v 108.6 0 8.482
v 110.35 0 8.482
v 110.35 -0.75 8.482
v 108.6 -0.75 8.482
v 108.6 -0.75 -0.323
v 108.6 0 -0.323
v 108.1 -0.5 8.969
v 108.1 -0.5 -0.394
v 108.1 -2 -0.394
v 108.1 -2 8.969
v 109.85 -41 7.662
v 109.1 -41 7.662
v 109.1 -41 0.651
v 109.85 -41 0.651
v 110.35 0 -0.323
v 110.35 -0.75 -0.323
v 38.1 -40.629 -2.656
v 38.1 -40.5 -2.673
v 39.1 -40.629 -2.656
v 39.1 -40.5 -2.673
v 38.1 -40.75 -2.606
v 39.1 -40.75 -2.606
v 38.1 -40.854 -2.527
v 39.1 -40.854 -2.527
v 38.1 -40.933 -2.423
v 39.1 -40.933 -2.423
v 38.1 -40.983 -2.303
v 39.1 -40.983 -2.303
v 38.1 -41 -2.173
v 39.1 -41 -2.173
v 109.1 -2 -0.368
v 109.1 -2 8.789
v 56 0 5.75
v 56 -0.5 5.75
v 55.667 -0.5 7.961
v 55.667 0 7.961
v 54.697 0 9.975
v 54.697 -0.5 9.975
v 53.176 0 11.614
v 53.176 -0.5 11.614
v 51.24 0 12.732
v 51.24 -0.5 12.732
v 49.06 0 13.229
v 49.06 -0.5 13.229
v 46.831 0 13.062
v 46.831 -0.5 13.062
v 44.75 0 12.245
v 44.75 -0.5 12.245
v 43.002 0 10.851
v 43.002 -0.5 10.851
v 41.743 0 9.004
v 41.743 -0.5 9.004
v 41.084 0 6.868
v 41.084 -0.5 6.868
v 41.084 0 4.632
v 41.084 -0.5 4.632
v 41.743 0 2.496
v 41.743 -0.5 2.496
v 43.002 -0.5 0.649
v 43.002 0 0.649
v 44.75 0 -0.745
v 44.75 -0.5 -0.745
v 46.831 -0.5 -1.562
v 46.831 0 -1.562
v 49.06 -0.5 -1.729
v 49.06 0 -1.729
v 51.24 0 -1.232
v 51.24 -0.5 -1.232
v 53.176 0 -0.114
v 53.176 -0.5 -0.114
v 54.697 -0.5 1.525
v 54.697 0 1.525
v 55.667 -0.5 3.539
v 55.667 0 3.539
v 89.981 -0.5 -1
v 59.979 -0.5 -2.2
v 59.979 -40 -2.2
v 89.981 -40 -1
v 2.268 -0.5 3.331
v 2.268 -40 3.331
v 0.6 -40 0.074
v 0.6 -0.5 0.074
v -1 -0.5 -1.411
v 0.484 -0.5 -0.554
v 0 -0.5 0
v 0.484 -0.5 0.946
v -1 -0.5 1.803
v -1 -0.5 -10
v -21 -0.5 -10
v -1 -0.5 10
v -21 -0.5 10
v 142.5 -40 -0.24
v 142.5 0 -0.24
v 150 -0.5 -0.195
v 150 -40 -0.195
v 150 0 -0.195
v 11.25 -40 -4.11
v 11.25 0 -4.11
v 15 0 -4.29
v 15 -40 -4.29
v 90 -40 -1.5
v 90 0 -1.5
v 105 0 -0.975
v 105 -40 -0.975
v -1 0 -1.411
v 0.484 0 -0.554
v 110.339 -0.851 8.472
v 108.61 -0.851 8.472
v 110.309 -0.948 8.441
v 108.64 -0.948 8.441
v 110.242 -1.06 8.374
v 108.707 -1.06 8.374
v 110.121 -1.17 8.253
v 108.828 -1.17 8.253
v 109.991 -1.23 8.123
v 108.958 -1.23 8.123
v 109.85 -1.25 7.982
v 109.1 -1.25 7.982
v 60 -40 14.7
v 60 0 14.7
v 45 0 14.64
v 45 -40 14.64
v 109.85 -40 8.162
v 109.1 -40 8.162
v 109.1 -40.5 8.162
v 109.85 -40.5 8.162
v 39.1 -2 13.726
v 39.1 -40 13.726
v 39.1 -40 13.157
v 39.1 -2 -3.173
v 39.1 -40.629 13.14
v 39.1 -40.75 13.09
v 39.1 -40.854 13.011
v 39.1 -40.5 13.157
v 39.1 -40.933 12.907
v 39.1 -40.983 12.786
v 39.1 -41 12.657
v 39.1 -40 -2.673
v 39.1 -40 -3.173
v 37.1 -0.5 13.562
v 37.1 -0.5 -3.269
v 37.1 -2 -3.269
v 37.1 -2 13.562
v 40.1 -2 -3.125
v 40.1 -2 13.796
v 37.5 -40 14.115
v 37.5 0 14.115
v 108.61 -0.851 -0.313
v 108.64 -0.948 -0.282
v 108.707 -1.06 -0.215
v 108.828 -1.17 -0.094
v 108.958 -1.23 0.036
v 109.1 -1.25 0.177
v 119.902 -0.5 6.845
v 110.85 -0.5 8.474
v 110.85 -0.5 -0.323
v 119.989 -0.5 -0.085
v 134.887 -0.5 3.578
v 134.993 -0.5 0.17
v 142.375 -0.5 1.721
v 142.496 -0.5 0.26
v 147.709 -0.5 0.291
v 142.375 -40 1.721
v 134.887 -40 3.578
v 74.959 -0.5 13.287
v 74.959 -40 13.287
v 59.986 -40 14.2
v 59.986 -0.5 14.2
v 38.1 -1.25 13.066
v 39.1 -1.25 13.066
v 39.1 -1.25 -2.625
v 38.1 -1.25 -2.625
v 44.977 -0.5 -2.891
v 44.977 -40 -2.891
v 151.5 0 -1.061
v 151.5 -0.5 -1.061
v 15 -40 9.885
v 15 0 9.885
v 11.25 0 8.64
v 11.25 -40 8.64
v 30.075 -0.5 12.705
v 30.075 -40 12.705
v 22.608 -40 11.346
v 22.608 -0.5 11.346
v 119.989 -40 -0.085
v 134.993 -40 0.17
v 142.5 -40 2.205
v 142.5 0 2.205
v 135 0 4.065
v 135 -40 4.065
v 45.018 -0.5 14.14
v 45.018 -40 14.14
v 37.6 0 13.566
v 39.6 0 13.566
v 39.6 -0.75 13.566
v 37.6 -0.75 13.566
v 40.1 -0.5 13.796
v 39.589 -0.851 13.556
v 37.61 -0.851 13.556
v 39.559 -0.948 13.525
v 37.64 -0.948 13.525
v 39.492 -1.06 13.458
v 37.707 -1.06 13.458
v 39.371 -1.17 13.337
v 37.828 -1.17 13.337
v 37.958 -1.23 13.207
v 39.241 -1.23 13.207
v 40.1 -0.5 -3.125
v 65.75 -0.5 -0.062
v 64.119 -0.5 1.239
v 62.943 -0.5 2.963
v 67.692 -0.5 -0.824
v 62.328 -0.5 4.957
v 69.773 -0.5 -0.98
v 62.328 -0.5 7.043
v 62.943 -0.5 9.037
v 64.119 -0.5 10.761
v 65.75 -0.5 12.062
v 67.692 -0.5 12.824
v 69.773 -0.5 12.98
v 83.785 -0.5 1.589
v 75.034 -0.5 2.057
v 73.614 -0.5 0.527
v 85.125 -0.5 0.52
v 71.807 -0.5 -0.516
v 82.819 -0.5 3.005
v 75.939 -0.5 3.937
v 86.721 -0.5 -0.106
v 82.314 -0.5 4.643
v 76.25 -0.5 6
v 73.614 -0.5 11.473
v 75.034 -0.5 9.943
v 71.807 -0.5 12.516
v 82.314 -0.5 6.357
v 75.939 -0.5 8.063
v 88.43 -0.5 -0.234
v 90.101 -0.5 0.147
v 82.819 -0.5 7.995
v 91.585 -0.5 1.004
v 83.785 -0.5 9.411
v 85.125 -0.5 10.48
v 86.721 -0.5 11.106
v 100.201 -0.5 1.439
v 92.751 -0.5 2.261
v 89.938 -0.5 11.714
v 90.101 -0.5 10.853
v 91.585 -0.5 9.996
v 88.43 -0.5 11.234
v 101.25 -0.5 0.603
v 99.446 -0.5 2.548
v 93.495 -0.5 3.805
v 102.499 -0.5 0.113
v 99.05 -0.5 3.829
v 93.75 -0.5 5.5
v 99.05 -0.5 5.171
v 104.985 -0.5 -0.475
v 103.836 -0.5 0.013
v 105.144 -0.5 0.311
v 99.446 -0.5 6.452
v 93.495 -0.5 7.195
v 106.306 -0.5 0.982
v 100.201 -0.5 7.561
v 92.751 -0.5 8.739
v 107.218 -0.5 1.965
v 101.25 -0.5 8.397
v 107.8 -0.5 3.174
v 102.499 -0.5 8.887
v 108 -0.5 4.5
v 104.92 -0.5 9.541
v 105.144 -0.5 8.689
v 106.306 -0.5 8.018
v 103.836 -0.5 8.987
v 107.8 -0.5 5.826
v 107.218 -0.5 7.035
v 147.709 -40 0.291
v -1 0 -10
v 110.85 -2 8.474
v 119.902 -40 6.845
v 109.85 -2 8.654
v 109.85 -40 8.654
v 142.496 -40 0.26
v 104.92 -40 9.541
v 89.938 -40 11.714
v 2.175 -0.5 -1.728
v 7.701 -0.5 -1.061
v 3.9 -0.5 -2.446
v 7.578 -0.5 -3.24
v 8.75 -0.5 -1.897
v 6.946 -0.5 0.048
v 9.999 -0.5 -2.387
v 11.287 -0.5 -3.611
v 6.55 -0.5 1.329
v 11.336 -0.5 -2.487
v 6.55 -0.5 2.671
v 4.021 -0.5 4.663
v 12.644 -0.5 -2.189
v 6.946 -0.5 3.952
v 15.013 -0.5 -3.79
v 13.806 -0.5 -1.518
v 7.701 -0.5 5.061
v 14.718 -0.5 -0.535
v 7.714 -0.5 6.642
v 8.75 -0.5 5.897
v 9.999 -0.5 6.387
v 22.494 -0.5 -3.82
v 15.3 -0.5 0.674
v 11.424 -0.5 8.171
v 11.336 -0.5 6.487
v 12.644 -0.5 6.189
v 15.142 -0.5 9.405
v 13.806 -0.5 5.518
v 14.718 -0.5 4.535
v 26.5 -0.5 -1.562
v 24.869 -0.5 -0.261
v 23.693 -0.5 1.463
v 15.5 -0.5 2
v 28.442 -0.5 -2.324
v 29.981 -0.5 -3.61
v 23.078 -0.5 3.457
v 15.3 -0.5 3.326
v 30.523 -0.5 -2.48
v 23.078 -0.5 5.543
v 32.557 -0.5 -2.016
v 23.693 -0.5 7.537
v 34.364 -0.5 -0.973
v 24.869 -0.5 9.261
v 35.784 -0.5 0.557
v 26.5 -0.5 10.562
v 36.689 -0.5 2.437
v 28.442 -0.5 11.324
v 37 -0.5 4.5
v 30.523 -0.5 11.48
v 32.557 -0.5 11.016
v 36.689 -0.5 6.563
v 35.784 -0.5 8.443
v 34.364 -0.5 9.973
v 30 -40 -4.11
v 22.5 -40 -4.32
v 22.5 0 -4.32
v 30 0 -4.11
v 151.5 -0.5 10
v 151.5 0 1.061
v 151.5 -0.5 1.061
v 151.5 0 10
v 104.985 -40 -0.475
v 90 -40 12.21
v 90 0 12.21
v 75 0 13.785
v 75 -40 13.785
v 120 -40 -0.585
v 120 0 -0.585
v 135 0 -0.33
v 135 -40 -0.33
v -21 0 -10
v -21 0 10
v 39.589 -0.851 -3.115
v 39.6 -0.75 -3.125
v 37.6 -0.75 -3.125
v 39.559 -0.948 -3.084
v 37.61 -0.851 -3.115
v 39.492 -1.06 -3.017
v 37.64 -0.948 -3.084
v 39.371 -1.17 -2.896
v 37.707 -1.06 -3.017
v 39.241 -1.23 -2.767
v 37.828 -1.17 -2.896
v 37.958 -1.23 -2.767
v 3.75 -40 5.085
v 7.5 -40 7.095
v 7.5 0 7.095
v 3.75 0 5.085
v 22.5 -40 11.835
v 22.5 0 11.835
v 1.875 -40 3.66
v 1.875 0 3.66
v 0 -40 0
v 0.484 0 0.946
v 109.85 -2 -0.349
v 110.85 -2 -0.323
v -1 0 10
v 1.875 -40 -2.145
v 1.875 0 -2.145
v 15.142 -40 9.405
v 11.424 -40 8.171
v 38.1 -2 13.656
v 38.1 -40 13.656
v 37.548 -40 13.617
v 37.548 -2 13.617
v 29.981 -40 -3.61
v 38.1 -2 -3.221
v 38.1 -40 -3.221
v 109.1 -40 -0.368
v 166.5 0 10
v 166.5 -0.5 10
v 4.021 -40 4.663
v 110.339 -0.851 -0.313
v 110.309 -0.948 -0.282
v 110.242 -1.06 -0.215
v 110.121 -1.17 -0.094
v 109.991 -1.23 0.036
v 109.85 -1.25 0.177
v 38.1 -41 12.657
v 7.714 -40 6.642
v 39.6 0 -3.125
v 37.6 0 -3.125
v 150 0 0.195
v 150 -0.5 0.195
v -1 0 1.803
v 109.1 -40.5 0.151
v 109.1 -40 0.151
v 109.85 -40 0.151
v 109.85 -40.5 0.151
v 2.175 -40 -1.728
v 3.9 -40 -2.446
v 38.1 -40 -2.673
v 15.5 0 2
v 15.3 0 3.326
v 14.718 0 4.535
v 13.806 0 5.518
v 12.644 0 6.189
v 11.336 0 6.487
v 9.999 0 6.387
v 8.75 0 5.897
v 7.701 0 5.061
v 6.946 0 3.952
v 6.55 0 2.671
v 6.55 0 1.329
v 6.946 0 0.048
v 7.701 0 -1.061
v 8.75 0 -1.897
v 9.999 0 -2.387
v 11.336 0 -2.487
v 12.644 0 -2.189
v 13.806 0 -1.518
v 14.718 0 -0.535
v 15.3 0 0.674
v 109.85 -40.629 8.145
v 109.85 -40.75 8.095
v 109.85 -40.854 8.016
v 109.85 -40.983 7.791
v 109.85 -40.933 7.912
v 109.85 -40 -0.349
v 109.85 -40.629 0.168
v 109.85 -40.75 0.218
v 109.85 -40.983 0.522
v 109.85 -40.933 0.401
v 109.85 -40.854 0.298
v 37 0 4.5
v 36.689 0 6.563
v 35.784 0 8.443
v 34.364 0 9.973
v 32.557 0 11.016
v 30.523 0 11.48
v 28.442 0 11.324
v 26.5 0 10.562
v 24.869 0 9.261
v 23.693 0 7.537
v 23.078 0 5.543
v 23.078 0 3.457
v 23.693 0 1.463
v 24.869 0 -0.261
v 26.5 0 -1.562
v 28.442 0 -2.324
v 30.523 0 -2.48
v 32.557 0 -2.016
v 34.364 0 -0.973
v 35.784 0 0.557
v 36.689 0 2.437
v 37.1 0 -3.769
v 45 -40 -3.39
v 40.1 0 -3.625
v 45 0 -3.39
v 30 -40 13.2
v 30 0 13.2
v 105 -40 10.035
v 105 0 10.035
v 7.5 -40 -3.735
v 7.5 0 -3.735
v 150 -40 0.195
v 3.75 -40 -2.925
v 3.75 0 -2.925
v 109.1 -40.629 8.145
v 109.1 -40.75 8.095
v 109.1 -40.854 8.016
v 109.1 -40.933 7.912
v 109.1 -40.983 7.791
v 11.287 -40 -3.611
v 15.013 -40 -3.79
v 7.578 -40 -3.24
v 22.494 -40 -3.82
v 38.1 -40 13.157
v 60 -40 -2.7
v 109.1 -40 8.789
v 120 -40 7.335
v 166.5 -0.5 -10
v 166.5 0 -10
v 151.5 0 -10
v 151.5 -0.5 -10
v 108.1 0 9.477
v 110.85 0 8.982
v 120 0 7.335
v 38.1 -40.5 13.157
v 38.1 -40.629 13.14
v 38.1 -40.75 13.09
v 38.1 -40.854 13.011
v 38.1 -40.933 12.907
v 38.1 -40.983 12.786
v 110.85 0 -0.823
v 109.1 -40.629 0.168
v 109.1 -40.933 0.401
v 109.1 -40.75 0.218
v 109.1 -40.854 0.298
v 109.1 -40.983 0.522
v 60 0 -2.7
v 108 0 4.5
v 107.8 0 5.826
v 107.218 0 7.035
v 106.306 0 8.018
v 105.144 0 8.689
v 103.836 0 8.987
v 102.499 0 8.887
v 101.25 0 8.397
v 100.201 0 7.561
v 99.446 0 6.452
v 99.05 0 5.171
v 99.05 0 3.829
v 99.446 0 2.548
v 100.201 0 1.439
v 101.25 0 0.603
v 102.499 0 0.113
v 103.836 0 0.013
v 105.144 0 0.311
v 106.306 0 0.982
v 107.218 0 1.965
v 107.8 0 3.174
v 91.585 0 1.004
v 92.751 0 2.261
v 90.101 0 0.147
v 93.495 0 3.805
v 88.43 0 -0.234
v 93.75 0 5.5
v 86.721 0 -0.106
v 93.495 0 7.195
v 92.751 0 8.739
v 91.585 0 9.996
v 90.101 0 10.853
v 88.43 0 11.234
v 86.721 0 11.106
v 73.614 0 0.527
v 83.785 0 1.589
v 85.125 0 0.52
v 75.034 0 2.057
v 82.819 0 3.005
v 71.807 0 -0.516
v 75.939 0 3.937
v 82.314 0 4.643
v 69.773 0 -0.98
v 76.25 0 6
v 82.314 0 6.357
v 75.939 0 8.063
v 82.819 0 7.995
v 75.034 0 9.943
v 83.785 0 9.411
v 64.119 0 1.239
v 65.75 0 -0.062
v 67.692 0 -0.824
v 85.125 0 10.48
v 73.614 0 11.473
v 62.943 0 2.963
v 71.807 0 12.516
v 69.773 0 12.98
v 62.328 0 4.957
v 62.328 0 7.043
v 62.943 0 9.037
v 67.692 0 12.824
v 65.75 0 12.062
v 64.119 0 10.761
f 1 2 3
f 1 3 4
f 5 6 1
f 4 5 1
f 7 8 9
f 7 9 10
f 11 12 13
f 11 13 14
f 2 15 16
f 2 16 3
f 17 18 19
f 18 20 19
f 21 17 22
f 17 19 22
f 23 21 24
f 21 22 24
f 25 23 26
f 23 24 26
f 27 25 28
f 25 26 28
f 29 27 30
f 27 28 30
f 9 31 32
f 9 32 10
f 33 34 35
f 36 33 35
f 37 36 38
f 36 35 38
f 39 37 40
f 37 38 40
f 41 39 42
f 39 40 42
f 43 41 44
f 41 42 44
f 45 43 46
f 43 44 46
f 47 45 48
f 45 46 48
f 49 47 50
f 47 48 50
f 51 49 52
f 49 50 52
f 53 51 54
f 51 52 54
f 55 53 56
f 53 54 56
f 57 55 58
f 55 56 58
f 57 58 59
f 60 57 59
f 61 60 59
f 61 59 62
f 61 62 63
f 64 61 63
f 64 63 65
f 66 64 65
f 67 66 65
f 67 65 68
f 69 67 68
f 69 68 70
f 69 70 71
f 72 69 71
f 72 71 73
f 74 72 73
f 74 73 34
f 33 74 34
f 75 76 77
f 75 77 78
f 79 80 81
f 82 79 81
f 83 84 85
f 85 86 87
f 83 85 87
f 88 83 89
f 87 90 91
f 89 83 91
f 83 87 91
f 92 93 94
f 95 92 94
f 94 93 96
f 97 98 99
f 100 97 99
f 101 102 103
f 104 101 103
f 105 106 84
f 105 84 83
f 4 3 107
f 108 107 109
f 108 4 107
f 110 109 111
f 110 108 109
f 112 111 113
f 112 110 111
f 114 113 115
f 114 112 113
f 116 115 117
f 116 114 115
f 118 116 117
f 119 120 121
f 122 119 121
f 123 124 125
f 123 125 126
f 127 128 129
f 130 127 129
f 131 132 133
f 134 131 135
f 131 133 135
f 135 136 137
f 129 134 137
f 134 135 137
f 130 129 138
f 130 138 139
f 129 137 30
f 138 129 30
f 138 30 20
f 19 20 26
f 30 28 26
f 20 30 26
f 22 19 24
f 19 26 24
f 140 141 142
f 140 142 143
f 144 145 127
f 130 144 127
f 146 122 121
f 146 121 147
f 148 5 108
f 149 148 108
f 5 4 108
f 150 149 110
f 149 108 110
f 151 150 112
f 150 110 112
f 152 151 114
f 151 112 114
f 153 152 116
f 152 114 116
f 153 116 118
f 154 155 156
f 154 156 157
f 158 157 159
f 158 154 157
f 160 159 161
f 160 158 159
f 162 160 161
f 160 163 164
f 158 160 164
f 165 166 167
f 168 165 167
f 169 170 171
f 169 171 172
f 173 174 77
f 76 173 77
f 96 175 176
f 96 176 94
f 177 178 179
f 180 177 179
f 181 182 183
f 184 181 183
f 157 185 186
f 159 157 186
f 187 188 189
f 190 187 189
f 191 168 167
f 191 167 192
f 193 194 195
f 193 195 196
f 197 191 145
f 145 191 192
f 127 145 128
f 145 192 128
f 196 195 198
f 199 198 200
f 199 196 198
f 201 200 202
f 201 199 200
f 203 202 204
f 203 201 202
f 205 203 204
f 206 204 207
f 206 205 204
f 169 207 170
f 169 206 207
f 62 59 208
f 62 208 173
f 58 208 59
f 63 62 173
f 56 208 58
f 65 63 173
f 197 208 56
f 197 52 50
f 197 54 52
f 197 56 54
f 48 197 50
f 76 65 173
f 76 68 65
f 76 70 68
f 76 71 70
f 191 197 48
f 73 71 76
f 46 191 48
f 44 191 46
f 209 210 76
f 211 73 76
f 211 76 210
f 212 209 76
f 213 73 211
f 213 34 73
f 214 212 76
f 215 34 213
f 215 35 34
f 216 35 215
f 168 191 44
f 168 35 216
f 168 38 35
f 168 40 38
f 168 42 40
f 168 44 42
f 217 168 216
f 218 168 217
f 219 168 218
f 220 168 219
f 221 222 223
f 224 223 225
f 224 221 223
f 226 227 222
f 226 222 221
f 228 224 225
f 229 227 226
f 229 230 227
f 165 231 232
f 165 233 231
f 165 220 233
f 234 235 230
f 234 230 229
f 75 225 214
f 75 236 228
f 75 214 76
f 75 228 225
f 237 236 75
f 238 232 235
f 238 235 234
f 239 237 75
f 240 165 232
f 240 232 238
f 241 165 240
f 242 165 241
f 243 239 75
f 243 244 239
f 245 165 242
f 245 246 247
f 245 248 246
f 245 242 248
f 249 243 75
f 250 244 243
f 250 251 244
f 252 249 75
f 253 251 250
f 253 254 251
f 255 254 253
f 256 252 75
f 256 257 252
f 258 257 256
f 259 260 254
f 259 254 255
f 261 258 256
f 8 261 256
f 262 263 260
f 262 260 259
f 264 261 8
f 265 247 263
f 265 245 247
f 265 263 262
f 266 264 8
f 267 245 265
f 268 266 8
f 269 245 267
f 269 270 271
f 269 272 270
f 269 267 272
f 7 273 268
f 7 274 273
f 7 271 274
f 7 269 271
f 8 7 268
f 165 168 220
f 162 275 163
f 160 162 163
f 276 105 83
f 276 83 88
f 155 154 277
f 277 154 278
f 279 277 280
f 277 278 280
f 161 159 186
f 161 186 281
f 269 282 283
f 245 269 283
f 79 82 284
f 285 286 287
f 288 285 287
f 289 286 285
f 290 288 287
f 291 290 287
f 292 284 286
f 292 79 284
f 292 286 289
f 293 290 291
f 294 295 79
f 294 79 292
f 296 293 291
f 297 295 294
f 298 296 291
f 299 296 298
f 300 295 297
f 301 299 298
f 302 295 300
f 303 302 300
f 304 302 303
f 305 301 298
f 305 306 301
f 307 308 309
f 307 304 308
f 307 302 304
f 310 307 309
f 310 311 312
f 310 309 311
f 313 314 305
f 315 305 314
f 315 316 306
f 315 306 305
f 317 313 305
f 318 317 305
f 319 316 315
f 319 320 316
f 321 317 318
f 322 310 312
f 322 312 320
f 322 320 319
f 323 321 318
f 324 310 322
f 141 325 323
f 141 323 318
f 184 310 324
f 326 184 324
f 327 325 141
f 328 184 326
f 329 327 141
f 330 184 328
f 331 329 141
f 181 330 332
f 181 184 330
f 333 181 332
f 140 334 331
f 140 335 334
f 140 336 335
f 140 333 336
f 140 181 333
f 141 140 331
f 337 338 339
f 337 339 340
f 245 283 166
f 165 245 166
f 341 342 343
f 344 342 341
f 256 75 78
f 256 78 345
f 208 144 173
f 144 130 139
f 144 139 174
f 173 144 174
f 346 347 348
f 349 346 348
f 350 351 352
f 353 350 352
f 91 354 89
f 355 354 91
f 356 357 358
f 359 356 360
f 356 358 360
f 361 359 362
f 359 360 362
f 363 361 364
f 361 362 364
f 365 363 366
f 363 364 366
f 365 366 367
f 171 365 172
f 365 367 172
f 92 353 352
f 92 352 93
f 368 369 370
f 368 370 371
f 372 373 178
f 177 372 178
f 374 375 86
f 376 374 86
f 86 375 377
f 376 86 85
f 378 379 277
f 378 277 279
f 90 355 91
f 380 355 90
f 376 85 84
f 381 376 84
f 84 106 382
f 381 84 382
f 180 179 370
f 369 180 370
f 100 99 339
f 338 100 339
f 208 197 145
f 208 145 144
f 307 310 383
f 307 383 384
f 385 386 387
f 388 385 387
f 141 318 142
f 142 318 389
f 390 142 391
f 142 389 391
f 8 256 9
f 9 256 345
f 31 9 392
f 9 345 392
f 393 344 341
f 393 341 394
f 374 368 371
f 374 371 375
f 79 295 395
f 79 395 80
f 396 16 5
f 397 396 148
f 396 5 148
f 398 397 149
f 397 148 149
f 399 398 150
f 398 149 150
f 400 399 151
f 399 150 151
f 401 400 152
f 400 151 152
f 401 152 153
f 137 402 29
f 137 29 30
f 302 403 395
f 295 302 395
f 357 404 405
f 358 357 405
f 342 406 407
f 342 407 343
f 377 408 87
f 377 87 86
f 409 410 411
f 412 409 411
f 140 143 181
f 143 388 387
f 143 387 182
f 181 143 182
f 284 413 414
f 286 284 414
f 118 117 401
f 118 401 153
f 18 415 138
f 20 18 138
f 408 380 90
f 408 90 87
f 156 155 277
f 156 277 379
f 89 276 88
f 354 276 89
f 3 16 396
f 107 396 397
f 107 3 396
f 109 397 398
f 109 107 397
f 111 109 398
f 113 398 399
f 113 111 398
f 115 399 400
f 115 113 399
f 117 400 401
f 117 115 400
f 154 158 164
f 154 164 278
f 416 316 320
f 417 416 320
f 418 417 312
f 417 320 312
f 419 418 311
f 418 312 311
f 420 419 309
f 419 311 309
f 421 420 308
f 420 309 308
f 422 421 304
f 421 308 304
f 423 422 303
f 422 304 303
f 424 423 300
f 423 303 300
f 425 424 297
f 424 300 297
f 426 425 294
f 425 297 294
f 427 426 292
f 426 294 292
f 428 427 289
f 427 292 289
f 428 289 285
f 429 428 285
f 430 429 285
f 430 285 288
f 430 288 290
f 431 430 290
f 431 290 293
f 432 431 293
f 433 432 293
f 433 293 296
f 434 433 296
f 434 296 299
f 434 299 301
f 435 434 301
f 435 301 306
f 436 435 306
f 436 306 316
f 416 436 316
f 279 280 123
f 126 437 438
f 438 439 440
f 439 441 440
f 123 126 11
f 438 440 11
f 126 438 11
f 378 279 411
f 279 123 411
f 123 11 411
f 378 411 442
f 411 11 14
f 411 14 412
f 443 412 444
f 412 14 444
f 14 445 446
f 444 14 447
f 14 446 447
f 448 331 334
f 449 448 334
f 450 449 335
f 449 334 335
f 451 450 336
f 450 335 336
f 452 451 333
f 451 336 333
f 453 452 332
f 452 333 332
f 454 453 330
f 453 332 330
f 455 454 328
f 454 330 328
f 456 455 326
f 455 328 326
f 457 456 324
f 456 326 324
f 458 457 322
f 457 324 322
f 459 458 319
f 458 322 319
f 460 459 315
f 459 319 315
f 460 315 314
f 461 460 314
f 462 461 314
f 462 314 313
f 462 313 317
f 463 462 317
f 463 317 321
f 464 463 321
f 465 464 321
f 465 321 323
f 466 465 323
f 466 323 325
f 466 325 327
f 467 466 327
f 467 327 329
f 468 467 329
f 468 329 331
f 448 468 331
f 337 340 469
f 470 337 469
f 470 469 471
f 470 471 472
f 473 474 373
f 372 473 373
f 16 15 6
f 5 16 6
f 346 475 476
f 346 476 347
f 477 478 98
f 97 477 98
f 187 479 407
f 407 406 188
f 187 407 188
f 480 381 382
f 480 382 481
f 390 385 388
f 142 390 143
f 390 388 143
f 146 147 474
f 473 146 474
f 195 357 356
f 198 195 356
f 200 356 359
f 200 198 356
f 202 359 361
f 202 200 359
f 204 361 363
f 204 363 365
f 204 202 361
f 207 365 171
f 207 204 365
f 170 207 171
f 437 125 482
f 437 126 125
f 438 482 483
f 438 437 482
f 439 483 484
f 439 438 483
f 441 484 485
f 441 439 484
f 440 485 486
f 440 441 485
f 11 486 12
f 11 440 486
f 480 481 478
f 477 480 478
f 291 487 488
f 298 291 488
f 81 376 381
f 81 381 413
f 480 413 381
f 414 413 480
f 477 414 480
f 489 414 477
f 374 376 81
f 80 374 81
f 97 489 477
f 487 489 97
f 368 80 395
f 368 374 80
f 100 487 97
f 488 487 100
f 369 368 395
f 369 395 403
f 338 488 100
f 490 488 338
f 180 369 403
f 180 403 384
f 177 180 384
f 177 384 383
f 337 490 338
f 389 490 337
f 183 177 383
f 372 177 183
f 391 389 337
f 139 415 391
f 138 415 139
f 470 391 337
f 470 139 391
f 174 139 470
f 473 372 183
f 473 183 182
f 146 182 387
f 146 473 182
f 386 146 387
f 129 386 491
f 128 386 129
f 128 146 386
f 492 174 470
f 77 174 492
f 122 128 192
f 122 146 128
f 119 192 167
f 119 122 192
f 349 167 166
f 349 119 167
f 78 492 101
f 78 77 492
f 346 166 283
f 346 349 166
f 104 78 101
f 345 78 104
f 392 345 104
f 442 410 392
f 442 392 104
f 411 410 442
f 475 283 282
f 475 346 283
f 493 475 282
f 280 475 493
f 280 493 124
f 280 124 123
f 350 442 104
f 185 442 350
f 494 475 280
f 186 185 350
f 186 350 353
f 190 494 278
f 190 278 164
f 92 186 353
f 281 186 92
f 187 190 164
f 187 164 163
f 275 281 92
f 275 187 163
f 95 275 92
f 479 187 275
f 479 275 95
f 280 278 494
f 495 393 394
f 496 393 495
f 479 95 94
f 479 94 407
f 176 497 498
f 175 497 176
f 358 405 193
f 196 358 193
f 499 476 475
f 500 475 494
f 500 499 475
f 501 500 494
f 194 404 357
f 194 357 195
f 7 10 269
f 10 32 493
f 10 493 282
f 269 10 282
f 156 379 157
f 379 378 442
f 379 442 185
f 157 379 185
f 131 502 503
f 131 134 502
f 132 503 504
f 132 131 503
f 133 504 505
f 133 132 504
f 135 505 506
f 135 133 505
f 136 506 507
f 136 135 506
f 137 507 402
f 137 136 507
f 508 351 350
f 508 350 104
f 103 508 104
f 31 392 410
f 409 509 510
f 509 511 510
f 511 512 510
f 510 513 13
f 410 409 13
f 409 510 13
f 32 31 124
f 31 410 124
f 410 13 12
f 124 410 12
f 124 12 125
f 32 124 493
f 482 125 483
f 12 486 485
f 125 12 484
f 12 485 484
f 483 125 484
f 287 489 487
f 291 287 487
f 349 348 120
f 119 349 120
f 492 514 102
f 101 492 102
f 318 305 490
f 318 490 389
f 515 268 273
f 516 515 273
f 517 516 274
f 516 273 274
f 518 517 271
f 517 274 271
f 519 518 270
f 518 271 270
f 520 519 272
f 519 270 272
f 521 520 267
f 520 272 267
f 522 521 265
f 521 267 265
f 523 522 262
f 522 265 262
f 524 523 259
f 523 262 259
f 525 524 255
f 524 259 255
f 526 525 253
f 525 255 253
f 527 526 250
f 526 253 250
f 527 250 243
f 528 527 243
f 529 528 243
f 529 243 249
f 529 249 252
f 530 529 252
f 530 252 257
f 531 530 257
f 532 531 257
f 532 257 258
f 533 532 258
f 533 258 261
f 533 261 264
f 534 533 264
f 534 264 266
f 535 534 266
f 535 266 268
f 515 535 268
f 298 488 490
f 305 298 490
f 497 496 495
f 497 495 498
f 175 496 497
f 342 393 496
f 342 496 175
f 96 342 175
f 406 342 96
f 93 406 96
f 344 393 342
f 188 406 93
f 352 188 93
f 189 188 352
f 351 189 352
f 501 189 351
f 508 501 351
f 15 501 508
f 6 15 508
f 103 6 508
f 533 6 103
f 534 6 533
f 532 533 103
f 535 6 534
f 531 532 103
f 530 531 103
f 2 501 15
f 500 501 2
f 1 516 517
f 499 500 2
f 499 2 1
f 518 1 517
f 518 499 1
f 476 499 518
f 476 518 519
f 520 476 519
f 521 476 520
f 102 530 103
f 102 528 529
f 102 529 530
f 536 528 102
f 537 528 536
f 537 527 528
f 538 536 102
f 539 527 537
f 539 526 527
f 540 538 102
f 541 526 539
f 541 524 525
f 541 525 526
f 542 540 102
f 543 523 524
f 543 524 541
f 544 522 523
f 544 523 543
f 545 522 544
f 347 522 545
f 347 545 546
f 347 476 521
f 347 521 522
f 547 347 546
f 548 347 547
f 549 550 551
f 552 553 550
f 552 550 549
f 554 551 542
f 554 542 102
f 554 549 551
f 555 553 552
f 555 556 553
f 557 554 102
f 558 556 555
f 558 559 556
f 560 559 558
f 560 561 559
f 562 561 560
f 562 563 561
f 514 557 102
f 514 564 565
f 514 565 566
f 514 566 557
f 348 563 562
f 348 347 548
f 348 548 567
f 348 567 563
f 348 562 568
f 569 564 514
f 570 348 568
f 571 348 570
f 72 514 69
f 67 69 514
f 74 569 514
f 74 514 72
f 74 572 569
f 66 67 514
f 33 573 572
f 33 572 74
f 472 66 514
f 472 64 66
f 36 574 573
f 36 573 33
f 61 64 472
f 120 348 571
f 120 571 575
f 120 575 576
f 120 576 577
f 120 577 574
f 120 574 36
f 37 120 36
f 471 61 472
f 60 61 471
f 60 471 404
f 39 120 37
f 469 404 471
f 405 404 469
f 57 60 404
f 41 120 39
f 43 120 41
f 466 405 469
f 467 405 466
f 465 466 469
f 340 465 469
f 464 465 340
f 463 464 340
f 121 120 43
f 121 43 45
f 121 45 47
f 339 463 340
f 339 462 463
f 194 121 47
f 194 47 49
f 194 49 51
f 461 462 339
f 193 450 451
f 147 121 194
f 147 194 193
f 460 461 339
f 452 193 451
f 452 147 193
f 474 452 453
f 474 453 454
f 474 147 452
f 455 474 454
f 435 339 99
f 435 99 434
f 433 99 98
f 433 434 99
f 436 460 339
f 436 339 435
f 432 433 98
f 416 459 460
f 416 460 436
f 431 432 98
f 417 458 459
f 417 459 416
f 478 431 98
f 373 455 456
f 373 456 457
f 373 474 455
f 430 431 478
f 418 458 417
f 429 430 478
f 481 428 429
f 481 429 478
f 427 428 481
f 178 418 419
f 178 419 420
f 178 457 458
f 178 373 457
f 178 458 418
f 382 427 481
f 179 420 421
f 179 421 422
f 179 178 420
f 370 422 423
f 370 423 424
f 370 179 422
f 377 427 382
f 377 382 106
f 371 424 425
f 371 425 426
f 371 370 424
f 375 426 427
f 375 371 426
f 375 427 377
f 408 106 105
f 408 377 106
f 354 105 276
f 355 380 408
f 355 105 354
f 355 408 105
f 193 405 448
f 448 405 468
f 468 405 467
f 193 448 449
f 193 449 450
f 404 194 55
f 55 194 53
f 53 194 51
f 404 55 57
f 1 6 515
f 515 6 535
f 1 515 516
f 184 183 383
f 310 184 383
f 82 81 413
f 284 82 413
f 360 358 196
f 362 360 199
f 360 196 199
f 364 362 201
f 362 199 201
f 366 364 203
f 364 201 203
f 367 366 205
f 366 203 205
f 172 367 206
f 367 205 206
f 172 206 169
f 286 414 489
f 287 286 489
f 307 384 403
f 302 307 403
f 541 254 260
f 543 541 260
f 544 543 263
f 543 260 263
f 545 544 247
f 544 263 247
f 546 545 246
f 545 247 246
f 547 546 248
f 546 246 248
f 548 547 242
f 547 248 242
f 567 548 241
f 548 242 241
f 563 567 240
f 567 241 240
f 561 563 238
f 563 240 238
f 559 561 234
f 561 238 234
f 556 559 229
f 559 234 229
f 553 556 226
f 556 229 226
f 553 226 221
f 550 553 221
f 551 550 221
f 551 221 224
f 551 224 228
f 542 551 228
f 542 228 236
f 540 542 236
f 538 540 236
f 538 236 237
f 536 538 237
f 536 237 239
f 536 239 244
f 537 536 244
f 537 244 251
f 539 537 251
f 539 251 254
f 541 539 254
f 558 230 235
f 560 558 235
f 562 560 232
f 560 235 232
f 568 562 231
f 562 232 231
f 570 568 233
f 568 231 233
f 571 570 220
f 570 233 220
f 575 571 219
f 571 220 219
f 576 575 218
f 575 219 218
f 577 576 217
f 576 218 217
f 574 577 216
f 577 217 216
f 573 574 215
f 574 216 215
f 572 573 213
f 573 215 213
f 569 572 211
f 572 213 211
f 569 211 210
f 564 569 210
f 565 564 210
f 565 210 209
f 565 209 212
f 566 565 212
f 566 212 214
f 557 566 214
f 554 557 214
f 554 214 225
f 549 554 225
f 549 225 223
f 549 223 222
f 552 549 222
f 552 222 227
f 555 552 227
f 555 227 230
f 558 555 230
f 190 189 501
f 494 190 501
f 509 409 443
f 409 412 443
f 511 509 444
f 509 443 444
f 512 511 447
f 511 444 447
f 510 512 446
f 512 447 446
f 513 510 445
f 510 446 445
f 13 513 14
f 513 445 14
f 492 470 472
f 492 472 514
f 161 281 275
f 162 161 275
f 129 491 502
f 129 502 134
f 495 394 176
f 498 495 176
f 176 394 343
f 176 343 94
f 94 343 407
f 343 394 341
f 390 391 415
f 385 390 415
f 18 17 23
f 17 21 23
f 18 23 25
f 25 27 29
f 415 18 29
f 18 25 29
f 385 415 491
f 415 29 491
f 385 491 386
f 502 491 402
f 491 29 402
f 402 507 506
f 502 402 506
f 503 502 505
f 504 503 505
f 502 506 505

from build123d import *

# Parameters (mm, degrees)
F1_DEPTH  = 40
F3_DEPTH  = 39.5
F4_R      = 4.5
F4_R_2    = 7
F4_R_3    = 7.5
F4_R_4    = 5.75
F5_DEPTH  = 0.501
F7_DEPTH  = 2
F8_W      = 1.75
F8_H      = 8.804983391
F8_W_2    = 2
F8_H_2    = 16.691370044
F9_DEPTH  = 1.25
F10_R     = 0.5
F11_W     = 0.75
F11_H     = 8.010983391
F11_W_2   = 1
F11_H_2   = 15.8301910942
F12_DEPTH = 1
F13_R     = 0.5
F15_DEPTH = 0.5
F17_DEPTH = 0.5


with BuildPart() as f1:
    # F0 (on Front) → F1 (new body)
    with BuildSketch(Plane.XZ):
        Polygon((150, -0.195), (150, 0.195), (142.5, 2.205), (135, 4.065), (120, 7.335), (105, 10.035), (90, 12.21), (75, 13.785), (60, 14.7), (45, 14.64), (37.5, 14.115), (30, 13.2), (22.5, 11.835), (15, 9.885), (11.25, 8.64), (7.5, 7.095), (3.75, 5.085), (1.875, 3.66), (0, 0), (1.875, -2.145), (3.75, -2.925), (7.5, -3.735), (11.25, -4.11), (15, -4.29), (22.5, -4.32), (30, -4.11), (37.5, -3.75), (45, -3.39), (60, -2.7), (75, -2.1), (90, -1.5), (105, -0.975), (120, -0.585), (135, -0.33), (142.5, -0.24), align=None)
    extrude(amount=F1_DEPTH)

    # F2 (on face) → F3 (cut)
    with BuildSketch(Plane.XZ.offset(40)):
        Polygon((22.494001199, -3.8199719571), (29.9810146479, -3.6103355805), (38.0995951893, -3.2206437145), (38.0995951893, 13.6557481124), (37.5477644894, 13.6171199634), (30.0751046996, 12.705455469), (22.6078220145, 11.3464100203), (15.1418358981, 9.4052536301), (11.4242210448, 8.1710054988), (7.7138856453, 6.6423473142), (4.0210598526, 4.6629926893), (2.2681271547, 3.3307638389), (0.5995951893, 0.0737894424), (2.1747084318, -1.728140107), (3.9000375829, -2.4458770339), (7.577907371, -3.2402969081), (11.2868867814, -3.6111948491), (15.0129924699, -3.7900479222), align=None)
        Polygon((89.9812632263, -1.0003495831), (104.9847572408, -0.4752272926), (109.0995951893, -0.3682415059), (109.0995951893, 8.7890373856), (104.9198136118, 9.5413980696), (89.9379946481, 11.7137618193), (74.958652077, 13.2865927893), (59.985763287, 14.1999390054), (45.0184773208, 14.1400698616), (39.0995951893, 13.7257481124), (39.0995951893, -3.1726437145), (44.9765259223, -2.8905510394), (59.9785199435, -2.2004593144), align=None)
        Polygon((109.8495951893, -0.3487415059), (119.9892525914, -0.0851104134), (134.992750784, 0.1699490558), (142.4955002021, 0.2599820488), (147.7092928365, 0.2912648047), (142.3750957537, 1.7208296229), (134.8865506068, 3.5779888193), (119.9024297861, 6.8445271582), (109.8495951893, 8.6540373856), align=None)
    extrude(amount=-F3_DEPTH, mode=Mode.SUBTRACT)

    # F4 (on face) → F5 (cut, through all)
    with BuildSketch(Plane.XZ.offset(0.5)):
        with Locations((11, 2)):
            Circle(F4_R)
        with Locations((30, 4.5)):
            Circle(F4_R_2)
        with Locations((48.5, 5.75)):
            Circle(F4_R_3)
        with Locations((69.25, 6)):
            Circle(F4_R_2)
        with Locations((88, 5.5)):
            Circle(F4_R_4)
        with Locations((103.5, 4.5)):
            Circle(F4_R)
    extrude(amount=-F5_DEPTH, mode=Mode.SUBTRACT)

    # F6 (on face) → F7 (join)
    with BuildSketch(Plane(origin=(0, 0, 0), x_dir=(-1, 0, 0), z_dir=(0, 1, 0))):
        Polygon((-110.8495951893, -0.8229105251), (-108.0995951893, -0.8944105251), (-108.0995951893, 9.4770728659), (-110.8495951893, 8.9820728659), align=None)
        Polygon((-37.0995951893, -3.7692194309), (-37.0995951893, 14.0661506131), (-37.5, 14.115), (-40.0995951893, 14.2969716633), (-40.0995951893, -3.6252194309), align=None)
    extrude(amount=-F7_DEPTH)

    # F8 (on face) → F9 (cut)
    with BuildSketch(Plane(origin=(0, 0, 0), x_dir=(-1, 0, 0), z_dir=(0, 1, 0))):
        with Locations((-109.4745951893, 4.0795811704)):
            Rectangle(F8_W, F8_H)
        with Locations((-38.5995951893, 5.2204655911)):
            Rectangle(F8_W_2, F8_H_2)
    extrude(amount=-F9_DEPTH, mode=Mode.SUBTRACT)

    # F10
    f10_edges = [f1.edges().sort_by_distance(p)[0] for p in [
        (37.599595, -1.25, 5.220466),
        (38.599595, -1.25, 13.566151),
        (39.599595, -1.25, 5.220466),
        (38.599595, -1.25, -3.125219),
        (108.599595, -1.25, 4.079581),
        (109.474595, -1.25, 8.482073),
        (110.349595, -1.25, 4.079581),
        (109.474595, -1.25, -0.322911),
    ]]
    fillet(f10_edges, radius=F10_R)

    # F11 (on face) → F12 (join)
    with BuildSketch(Plane.XZ.offset(40)):
        with Locations((109.4745951893, 4.1565811704)):
            Rectangle(F11_W, F11_H)
        with Locations((38.5995951893, 5.2418761162)):
            Rectangle(F11_W_2, F11_H_2)
    extrude(amount=F12_DEPTH)

    # F13
    f13_edges = [f1.edges().sort_by_distance(p)[0] for p in [
        (38.599595, -41, 13.156972),
        (38.599595, -41, -2.673219),
        (109.474595, -41, 0.151089),
        (109.474595, -41, 8.162073),
    ]]
    fillet(f13_edges, radius=F13_R)

    # F14 (on face) → F15 (join)
    with BuildSketch(Plane(origin=(0, 0, 0), x_dir=(-1, 0, 0), z_dir=(0, 1, 0))):
        Polygon((21, 10), (1, 10), (1, 1.8028106709), (-0.484496124, 0.9457364341), (0, 0), (-0.484496124, -0.5542635659), (1, -1.4113378027), (1, -10), (21, -10), align=None)
    extrude(amount=-F15_DEPTH)

    # F16 (on face) → F17 (join)
    with BuildSketch(Plane(origin=(0, 0, 0), x_dir=(-1, 0, 0), z_dir=(0, 1, 0))):
        Polygon((-151.5, 1.0610254038), (-151.5, 10), (-166.5, 10), (-166.5, -10), (-151.5, -10), (-151.5, -1.0610254038), (-150, -0.195), (-150, 0.195), align=None)
    extrude(amount=-F17_DEPTH)


solid = f1.part
